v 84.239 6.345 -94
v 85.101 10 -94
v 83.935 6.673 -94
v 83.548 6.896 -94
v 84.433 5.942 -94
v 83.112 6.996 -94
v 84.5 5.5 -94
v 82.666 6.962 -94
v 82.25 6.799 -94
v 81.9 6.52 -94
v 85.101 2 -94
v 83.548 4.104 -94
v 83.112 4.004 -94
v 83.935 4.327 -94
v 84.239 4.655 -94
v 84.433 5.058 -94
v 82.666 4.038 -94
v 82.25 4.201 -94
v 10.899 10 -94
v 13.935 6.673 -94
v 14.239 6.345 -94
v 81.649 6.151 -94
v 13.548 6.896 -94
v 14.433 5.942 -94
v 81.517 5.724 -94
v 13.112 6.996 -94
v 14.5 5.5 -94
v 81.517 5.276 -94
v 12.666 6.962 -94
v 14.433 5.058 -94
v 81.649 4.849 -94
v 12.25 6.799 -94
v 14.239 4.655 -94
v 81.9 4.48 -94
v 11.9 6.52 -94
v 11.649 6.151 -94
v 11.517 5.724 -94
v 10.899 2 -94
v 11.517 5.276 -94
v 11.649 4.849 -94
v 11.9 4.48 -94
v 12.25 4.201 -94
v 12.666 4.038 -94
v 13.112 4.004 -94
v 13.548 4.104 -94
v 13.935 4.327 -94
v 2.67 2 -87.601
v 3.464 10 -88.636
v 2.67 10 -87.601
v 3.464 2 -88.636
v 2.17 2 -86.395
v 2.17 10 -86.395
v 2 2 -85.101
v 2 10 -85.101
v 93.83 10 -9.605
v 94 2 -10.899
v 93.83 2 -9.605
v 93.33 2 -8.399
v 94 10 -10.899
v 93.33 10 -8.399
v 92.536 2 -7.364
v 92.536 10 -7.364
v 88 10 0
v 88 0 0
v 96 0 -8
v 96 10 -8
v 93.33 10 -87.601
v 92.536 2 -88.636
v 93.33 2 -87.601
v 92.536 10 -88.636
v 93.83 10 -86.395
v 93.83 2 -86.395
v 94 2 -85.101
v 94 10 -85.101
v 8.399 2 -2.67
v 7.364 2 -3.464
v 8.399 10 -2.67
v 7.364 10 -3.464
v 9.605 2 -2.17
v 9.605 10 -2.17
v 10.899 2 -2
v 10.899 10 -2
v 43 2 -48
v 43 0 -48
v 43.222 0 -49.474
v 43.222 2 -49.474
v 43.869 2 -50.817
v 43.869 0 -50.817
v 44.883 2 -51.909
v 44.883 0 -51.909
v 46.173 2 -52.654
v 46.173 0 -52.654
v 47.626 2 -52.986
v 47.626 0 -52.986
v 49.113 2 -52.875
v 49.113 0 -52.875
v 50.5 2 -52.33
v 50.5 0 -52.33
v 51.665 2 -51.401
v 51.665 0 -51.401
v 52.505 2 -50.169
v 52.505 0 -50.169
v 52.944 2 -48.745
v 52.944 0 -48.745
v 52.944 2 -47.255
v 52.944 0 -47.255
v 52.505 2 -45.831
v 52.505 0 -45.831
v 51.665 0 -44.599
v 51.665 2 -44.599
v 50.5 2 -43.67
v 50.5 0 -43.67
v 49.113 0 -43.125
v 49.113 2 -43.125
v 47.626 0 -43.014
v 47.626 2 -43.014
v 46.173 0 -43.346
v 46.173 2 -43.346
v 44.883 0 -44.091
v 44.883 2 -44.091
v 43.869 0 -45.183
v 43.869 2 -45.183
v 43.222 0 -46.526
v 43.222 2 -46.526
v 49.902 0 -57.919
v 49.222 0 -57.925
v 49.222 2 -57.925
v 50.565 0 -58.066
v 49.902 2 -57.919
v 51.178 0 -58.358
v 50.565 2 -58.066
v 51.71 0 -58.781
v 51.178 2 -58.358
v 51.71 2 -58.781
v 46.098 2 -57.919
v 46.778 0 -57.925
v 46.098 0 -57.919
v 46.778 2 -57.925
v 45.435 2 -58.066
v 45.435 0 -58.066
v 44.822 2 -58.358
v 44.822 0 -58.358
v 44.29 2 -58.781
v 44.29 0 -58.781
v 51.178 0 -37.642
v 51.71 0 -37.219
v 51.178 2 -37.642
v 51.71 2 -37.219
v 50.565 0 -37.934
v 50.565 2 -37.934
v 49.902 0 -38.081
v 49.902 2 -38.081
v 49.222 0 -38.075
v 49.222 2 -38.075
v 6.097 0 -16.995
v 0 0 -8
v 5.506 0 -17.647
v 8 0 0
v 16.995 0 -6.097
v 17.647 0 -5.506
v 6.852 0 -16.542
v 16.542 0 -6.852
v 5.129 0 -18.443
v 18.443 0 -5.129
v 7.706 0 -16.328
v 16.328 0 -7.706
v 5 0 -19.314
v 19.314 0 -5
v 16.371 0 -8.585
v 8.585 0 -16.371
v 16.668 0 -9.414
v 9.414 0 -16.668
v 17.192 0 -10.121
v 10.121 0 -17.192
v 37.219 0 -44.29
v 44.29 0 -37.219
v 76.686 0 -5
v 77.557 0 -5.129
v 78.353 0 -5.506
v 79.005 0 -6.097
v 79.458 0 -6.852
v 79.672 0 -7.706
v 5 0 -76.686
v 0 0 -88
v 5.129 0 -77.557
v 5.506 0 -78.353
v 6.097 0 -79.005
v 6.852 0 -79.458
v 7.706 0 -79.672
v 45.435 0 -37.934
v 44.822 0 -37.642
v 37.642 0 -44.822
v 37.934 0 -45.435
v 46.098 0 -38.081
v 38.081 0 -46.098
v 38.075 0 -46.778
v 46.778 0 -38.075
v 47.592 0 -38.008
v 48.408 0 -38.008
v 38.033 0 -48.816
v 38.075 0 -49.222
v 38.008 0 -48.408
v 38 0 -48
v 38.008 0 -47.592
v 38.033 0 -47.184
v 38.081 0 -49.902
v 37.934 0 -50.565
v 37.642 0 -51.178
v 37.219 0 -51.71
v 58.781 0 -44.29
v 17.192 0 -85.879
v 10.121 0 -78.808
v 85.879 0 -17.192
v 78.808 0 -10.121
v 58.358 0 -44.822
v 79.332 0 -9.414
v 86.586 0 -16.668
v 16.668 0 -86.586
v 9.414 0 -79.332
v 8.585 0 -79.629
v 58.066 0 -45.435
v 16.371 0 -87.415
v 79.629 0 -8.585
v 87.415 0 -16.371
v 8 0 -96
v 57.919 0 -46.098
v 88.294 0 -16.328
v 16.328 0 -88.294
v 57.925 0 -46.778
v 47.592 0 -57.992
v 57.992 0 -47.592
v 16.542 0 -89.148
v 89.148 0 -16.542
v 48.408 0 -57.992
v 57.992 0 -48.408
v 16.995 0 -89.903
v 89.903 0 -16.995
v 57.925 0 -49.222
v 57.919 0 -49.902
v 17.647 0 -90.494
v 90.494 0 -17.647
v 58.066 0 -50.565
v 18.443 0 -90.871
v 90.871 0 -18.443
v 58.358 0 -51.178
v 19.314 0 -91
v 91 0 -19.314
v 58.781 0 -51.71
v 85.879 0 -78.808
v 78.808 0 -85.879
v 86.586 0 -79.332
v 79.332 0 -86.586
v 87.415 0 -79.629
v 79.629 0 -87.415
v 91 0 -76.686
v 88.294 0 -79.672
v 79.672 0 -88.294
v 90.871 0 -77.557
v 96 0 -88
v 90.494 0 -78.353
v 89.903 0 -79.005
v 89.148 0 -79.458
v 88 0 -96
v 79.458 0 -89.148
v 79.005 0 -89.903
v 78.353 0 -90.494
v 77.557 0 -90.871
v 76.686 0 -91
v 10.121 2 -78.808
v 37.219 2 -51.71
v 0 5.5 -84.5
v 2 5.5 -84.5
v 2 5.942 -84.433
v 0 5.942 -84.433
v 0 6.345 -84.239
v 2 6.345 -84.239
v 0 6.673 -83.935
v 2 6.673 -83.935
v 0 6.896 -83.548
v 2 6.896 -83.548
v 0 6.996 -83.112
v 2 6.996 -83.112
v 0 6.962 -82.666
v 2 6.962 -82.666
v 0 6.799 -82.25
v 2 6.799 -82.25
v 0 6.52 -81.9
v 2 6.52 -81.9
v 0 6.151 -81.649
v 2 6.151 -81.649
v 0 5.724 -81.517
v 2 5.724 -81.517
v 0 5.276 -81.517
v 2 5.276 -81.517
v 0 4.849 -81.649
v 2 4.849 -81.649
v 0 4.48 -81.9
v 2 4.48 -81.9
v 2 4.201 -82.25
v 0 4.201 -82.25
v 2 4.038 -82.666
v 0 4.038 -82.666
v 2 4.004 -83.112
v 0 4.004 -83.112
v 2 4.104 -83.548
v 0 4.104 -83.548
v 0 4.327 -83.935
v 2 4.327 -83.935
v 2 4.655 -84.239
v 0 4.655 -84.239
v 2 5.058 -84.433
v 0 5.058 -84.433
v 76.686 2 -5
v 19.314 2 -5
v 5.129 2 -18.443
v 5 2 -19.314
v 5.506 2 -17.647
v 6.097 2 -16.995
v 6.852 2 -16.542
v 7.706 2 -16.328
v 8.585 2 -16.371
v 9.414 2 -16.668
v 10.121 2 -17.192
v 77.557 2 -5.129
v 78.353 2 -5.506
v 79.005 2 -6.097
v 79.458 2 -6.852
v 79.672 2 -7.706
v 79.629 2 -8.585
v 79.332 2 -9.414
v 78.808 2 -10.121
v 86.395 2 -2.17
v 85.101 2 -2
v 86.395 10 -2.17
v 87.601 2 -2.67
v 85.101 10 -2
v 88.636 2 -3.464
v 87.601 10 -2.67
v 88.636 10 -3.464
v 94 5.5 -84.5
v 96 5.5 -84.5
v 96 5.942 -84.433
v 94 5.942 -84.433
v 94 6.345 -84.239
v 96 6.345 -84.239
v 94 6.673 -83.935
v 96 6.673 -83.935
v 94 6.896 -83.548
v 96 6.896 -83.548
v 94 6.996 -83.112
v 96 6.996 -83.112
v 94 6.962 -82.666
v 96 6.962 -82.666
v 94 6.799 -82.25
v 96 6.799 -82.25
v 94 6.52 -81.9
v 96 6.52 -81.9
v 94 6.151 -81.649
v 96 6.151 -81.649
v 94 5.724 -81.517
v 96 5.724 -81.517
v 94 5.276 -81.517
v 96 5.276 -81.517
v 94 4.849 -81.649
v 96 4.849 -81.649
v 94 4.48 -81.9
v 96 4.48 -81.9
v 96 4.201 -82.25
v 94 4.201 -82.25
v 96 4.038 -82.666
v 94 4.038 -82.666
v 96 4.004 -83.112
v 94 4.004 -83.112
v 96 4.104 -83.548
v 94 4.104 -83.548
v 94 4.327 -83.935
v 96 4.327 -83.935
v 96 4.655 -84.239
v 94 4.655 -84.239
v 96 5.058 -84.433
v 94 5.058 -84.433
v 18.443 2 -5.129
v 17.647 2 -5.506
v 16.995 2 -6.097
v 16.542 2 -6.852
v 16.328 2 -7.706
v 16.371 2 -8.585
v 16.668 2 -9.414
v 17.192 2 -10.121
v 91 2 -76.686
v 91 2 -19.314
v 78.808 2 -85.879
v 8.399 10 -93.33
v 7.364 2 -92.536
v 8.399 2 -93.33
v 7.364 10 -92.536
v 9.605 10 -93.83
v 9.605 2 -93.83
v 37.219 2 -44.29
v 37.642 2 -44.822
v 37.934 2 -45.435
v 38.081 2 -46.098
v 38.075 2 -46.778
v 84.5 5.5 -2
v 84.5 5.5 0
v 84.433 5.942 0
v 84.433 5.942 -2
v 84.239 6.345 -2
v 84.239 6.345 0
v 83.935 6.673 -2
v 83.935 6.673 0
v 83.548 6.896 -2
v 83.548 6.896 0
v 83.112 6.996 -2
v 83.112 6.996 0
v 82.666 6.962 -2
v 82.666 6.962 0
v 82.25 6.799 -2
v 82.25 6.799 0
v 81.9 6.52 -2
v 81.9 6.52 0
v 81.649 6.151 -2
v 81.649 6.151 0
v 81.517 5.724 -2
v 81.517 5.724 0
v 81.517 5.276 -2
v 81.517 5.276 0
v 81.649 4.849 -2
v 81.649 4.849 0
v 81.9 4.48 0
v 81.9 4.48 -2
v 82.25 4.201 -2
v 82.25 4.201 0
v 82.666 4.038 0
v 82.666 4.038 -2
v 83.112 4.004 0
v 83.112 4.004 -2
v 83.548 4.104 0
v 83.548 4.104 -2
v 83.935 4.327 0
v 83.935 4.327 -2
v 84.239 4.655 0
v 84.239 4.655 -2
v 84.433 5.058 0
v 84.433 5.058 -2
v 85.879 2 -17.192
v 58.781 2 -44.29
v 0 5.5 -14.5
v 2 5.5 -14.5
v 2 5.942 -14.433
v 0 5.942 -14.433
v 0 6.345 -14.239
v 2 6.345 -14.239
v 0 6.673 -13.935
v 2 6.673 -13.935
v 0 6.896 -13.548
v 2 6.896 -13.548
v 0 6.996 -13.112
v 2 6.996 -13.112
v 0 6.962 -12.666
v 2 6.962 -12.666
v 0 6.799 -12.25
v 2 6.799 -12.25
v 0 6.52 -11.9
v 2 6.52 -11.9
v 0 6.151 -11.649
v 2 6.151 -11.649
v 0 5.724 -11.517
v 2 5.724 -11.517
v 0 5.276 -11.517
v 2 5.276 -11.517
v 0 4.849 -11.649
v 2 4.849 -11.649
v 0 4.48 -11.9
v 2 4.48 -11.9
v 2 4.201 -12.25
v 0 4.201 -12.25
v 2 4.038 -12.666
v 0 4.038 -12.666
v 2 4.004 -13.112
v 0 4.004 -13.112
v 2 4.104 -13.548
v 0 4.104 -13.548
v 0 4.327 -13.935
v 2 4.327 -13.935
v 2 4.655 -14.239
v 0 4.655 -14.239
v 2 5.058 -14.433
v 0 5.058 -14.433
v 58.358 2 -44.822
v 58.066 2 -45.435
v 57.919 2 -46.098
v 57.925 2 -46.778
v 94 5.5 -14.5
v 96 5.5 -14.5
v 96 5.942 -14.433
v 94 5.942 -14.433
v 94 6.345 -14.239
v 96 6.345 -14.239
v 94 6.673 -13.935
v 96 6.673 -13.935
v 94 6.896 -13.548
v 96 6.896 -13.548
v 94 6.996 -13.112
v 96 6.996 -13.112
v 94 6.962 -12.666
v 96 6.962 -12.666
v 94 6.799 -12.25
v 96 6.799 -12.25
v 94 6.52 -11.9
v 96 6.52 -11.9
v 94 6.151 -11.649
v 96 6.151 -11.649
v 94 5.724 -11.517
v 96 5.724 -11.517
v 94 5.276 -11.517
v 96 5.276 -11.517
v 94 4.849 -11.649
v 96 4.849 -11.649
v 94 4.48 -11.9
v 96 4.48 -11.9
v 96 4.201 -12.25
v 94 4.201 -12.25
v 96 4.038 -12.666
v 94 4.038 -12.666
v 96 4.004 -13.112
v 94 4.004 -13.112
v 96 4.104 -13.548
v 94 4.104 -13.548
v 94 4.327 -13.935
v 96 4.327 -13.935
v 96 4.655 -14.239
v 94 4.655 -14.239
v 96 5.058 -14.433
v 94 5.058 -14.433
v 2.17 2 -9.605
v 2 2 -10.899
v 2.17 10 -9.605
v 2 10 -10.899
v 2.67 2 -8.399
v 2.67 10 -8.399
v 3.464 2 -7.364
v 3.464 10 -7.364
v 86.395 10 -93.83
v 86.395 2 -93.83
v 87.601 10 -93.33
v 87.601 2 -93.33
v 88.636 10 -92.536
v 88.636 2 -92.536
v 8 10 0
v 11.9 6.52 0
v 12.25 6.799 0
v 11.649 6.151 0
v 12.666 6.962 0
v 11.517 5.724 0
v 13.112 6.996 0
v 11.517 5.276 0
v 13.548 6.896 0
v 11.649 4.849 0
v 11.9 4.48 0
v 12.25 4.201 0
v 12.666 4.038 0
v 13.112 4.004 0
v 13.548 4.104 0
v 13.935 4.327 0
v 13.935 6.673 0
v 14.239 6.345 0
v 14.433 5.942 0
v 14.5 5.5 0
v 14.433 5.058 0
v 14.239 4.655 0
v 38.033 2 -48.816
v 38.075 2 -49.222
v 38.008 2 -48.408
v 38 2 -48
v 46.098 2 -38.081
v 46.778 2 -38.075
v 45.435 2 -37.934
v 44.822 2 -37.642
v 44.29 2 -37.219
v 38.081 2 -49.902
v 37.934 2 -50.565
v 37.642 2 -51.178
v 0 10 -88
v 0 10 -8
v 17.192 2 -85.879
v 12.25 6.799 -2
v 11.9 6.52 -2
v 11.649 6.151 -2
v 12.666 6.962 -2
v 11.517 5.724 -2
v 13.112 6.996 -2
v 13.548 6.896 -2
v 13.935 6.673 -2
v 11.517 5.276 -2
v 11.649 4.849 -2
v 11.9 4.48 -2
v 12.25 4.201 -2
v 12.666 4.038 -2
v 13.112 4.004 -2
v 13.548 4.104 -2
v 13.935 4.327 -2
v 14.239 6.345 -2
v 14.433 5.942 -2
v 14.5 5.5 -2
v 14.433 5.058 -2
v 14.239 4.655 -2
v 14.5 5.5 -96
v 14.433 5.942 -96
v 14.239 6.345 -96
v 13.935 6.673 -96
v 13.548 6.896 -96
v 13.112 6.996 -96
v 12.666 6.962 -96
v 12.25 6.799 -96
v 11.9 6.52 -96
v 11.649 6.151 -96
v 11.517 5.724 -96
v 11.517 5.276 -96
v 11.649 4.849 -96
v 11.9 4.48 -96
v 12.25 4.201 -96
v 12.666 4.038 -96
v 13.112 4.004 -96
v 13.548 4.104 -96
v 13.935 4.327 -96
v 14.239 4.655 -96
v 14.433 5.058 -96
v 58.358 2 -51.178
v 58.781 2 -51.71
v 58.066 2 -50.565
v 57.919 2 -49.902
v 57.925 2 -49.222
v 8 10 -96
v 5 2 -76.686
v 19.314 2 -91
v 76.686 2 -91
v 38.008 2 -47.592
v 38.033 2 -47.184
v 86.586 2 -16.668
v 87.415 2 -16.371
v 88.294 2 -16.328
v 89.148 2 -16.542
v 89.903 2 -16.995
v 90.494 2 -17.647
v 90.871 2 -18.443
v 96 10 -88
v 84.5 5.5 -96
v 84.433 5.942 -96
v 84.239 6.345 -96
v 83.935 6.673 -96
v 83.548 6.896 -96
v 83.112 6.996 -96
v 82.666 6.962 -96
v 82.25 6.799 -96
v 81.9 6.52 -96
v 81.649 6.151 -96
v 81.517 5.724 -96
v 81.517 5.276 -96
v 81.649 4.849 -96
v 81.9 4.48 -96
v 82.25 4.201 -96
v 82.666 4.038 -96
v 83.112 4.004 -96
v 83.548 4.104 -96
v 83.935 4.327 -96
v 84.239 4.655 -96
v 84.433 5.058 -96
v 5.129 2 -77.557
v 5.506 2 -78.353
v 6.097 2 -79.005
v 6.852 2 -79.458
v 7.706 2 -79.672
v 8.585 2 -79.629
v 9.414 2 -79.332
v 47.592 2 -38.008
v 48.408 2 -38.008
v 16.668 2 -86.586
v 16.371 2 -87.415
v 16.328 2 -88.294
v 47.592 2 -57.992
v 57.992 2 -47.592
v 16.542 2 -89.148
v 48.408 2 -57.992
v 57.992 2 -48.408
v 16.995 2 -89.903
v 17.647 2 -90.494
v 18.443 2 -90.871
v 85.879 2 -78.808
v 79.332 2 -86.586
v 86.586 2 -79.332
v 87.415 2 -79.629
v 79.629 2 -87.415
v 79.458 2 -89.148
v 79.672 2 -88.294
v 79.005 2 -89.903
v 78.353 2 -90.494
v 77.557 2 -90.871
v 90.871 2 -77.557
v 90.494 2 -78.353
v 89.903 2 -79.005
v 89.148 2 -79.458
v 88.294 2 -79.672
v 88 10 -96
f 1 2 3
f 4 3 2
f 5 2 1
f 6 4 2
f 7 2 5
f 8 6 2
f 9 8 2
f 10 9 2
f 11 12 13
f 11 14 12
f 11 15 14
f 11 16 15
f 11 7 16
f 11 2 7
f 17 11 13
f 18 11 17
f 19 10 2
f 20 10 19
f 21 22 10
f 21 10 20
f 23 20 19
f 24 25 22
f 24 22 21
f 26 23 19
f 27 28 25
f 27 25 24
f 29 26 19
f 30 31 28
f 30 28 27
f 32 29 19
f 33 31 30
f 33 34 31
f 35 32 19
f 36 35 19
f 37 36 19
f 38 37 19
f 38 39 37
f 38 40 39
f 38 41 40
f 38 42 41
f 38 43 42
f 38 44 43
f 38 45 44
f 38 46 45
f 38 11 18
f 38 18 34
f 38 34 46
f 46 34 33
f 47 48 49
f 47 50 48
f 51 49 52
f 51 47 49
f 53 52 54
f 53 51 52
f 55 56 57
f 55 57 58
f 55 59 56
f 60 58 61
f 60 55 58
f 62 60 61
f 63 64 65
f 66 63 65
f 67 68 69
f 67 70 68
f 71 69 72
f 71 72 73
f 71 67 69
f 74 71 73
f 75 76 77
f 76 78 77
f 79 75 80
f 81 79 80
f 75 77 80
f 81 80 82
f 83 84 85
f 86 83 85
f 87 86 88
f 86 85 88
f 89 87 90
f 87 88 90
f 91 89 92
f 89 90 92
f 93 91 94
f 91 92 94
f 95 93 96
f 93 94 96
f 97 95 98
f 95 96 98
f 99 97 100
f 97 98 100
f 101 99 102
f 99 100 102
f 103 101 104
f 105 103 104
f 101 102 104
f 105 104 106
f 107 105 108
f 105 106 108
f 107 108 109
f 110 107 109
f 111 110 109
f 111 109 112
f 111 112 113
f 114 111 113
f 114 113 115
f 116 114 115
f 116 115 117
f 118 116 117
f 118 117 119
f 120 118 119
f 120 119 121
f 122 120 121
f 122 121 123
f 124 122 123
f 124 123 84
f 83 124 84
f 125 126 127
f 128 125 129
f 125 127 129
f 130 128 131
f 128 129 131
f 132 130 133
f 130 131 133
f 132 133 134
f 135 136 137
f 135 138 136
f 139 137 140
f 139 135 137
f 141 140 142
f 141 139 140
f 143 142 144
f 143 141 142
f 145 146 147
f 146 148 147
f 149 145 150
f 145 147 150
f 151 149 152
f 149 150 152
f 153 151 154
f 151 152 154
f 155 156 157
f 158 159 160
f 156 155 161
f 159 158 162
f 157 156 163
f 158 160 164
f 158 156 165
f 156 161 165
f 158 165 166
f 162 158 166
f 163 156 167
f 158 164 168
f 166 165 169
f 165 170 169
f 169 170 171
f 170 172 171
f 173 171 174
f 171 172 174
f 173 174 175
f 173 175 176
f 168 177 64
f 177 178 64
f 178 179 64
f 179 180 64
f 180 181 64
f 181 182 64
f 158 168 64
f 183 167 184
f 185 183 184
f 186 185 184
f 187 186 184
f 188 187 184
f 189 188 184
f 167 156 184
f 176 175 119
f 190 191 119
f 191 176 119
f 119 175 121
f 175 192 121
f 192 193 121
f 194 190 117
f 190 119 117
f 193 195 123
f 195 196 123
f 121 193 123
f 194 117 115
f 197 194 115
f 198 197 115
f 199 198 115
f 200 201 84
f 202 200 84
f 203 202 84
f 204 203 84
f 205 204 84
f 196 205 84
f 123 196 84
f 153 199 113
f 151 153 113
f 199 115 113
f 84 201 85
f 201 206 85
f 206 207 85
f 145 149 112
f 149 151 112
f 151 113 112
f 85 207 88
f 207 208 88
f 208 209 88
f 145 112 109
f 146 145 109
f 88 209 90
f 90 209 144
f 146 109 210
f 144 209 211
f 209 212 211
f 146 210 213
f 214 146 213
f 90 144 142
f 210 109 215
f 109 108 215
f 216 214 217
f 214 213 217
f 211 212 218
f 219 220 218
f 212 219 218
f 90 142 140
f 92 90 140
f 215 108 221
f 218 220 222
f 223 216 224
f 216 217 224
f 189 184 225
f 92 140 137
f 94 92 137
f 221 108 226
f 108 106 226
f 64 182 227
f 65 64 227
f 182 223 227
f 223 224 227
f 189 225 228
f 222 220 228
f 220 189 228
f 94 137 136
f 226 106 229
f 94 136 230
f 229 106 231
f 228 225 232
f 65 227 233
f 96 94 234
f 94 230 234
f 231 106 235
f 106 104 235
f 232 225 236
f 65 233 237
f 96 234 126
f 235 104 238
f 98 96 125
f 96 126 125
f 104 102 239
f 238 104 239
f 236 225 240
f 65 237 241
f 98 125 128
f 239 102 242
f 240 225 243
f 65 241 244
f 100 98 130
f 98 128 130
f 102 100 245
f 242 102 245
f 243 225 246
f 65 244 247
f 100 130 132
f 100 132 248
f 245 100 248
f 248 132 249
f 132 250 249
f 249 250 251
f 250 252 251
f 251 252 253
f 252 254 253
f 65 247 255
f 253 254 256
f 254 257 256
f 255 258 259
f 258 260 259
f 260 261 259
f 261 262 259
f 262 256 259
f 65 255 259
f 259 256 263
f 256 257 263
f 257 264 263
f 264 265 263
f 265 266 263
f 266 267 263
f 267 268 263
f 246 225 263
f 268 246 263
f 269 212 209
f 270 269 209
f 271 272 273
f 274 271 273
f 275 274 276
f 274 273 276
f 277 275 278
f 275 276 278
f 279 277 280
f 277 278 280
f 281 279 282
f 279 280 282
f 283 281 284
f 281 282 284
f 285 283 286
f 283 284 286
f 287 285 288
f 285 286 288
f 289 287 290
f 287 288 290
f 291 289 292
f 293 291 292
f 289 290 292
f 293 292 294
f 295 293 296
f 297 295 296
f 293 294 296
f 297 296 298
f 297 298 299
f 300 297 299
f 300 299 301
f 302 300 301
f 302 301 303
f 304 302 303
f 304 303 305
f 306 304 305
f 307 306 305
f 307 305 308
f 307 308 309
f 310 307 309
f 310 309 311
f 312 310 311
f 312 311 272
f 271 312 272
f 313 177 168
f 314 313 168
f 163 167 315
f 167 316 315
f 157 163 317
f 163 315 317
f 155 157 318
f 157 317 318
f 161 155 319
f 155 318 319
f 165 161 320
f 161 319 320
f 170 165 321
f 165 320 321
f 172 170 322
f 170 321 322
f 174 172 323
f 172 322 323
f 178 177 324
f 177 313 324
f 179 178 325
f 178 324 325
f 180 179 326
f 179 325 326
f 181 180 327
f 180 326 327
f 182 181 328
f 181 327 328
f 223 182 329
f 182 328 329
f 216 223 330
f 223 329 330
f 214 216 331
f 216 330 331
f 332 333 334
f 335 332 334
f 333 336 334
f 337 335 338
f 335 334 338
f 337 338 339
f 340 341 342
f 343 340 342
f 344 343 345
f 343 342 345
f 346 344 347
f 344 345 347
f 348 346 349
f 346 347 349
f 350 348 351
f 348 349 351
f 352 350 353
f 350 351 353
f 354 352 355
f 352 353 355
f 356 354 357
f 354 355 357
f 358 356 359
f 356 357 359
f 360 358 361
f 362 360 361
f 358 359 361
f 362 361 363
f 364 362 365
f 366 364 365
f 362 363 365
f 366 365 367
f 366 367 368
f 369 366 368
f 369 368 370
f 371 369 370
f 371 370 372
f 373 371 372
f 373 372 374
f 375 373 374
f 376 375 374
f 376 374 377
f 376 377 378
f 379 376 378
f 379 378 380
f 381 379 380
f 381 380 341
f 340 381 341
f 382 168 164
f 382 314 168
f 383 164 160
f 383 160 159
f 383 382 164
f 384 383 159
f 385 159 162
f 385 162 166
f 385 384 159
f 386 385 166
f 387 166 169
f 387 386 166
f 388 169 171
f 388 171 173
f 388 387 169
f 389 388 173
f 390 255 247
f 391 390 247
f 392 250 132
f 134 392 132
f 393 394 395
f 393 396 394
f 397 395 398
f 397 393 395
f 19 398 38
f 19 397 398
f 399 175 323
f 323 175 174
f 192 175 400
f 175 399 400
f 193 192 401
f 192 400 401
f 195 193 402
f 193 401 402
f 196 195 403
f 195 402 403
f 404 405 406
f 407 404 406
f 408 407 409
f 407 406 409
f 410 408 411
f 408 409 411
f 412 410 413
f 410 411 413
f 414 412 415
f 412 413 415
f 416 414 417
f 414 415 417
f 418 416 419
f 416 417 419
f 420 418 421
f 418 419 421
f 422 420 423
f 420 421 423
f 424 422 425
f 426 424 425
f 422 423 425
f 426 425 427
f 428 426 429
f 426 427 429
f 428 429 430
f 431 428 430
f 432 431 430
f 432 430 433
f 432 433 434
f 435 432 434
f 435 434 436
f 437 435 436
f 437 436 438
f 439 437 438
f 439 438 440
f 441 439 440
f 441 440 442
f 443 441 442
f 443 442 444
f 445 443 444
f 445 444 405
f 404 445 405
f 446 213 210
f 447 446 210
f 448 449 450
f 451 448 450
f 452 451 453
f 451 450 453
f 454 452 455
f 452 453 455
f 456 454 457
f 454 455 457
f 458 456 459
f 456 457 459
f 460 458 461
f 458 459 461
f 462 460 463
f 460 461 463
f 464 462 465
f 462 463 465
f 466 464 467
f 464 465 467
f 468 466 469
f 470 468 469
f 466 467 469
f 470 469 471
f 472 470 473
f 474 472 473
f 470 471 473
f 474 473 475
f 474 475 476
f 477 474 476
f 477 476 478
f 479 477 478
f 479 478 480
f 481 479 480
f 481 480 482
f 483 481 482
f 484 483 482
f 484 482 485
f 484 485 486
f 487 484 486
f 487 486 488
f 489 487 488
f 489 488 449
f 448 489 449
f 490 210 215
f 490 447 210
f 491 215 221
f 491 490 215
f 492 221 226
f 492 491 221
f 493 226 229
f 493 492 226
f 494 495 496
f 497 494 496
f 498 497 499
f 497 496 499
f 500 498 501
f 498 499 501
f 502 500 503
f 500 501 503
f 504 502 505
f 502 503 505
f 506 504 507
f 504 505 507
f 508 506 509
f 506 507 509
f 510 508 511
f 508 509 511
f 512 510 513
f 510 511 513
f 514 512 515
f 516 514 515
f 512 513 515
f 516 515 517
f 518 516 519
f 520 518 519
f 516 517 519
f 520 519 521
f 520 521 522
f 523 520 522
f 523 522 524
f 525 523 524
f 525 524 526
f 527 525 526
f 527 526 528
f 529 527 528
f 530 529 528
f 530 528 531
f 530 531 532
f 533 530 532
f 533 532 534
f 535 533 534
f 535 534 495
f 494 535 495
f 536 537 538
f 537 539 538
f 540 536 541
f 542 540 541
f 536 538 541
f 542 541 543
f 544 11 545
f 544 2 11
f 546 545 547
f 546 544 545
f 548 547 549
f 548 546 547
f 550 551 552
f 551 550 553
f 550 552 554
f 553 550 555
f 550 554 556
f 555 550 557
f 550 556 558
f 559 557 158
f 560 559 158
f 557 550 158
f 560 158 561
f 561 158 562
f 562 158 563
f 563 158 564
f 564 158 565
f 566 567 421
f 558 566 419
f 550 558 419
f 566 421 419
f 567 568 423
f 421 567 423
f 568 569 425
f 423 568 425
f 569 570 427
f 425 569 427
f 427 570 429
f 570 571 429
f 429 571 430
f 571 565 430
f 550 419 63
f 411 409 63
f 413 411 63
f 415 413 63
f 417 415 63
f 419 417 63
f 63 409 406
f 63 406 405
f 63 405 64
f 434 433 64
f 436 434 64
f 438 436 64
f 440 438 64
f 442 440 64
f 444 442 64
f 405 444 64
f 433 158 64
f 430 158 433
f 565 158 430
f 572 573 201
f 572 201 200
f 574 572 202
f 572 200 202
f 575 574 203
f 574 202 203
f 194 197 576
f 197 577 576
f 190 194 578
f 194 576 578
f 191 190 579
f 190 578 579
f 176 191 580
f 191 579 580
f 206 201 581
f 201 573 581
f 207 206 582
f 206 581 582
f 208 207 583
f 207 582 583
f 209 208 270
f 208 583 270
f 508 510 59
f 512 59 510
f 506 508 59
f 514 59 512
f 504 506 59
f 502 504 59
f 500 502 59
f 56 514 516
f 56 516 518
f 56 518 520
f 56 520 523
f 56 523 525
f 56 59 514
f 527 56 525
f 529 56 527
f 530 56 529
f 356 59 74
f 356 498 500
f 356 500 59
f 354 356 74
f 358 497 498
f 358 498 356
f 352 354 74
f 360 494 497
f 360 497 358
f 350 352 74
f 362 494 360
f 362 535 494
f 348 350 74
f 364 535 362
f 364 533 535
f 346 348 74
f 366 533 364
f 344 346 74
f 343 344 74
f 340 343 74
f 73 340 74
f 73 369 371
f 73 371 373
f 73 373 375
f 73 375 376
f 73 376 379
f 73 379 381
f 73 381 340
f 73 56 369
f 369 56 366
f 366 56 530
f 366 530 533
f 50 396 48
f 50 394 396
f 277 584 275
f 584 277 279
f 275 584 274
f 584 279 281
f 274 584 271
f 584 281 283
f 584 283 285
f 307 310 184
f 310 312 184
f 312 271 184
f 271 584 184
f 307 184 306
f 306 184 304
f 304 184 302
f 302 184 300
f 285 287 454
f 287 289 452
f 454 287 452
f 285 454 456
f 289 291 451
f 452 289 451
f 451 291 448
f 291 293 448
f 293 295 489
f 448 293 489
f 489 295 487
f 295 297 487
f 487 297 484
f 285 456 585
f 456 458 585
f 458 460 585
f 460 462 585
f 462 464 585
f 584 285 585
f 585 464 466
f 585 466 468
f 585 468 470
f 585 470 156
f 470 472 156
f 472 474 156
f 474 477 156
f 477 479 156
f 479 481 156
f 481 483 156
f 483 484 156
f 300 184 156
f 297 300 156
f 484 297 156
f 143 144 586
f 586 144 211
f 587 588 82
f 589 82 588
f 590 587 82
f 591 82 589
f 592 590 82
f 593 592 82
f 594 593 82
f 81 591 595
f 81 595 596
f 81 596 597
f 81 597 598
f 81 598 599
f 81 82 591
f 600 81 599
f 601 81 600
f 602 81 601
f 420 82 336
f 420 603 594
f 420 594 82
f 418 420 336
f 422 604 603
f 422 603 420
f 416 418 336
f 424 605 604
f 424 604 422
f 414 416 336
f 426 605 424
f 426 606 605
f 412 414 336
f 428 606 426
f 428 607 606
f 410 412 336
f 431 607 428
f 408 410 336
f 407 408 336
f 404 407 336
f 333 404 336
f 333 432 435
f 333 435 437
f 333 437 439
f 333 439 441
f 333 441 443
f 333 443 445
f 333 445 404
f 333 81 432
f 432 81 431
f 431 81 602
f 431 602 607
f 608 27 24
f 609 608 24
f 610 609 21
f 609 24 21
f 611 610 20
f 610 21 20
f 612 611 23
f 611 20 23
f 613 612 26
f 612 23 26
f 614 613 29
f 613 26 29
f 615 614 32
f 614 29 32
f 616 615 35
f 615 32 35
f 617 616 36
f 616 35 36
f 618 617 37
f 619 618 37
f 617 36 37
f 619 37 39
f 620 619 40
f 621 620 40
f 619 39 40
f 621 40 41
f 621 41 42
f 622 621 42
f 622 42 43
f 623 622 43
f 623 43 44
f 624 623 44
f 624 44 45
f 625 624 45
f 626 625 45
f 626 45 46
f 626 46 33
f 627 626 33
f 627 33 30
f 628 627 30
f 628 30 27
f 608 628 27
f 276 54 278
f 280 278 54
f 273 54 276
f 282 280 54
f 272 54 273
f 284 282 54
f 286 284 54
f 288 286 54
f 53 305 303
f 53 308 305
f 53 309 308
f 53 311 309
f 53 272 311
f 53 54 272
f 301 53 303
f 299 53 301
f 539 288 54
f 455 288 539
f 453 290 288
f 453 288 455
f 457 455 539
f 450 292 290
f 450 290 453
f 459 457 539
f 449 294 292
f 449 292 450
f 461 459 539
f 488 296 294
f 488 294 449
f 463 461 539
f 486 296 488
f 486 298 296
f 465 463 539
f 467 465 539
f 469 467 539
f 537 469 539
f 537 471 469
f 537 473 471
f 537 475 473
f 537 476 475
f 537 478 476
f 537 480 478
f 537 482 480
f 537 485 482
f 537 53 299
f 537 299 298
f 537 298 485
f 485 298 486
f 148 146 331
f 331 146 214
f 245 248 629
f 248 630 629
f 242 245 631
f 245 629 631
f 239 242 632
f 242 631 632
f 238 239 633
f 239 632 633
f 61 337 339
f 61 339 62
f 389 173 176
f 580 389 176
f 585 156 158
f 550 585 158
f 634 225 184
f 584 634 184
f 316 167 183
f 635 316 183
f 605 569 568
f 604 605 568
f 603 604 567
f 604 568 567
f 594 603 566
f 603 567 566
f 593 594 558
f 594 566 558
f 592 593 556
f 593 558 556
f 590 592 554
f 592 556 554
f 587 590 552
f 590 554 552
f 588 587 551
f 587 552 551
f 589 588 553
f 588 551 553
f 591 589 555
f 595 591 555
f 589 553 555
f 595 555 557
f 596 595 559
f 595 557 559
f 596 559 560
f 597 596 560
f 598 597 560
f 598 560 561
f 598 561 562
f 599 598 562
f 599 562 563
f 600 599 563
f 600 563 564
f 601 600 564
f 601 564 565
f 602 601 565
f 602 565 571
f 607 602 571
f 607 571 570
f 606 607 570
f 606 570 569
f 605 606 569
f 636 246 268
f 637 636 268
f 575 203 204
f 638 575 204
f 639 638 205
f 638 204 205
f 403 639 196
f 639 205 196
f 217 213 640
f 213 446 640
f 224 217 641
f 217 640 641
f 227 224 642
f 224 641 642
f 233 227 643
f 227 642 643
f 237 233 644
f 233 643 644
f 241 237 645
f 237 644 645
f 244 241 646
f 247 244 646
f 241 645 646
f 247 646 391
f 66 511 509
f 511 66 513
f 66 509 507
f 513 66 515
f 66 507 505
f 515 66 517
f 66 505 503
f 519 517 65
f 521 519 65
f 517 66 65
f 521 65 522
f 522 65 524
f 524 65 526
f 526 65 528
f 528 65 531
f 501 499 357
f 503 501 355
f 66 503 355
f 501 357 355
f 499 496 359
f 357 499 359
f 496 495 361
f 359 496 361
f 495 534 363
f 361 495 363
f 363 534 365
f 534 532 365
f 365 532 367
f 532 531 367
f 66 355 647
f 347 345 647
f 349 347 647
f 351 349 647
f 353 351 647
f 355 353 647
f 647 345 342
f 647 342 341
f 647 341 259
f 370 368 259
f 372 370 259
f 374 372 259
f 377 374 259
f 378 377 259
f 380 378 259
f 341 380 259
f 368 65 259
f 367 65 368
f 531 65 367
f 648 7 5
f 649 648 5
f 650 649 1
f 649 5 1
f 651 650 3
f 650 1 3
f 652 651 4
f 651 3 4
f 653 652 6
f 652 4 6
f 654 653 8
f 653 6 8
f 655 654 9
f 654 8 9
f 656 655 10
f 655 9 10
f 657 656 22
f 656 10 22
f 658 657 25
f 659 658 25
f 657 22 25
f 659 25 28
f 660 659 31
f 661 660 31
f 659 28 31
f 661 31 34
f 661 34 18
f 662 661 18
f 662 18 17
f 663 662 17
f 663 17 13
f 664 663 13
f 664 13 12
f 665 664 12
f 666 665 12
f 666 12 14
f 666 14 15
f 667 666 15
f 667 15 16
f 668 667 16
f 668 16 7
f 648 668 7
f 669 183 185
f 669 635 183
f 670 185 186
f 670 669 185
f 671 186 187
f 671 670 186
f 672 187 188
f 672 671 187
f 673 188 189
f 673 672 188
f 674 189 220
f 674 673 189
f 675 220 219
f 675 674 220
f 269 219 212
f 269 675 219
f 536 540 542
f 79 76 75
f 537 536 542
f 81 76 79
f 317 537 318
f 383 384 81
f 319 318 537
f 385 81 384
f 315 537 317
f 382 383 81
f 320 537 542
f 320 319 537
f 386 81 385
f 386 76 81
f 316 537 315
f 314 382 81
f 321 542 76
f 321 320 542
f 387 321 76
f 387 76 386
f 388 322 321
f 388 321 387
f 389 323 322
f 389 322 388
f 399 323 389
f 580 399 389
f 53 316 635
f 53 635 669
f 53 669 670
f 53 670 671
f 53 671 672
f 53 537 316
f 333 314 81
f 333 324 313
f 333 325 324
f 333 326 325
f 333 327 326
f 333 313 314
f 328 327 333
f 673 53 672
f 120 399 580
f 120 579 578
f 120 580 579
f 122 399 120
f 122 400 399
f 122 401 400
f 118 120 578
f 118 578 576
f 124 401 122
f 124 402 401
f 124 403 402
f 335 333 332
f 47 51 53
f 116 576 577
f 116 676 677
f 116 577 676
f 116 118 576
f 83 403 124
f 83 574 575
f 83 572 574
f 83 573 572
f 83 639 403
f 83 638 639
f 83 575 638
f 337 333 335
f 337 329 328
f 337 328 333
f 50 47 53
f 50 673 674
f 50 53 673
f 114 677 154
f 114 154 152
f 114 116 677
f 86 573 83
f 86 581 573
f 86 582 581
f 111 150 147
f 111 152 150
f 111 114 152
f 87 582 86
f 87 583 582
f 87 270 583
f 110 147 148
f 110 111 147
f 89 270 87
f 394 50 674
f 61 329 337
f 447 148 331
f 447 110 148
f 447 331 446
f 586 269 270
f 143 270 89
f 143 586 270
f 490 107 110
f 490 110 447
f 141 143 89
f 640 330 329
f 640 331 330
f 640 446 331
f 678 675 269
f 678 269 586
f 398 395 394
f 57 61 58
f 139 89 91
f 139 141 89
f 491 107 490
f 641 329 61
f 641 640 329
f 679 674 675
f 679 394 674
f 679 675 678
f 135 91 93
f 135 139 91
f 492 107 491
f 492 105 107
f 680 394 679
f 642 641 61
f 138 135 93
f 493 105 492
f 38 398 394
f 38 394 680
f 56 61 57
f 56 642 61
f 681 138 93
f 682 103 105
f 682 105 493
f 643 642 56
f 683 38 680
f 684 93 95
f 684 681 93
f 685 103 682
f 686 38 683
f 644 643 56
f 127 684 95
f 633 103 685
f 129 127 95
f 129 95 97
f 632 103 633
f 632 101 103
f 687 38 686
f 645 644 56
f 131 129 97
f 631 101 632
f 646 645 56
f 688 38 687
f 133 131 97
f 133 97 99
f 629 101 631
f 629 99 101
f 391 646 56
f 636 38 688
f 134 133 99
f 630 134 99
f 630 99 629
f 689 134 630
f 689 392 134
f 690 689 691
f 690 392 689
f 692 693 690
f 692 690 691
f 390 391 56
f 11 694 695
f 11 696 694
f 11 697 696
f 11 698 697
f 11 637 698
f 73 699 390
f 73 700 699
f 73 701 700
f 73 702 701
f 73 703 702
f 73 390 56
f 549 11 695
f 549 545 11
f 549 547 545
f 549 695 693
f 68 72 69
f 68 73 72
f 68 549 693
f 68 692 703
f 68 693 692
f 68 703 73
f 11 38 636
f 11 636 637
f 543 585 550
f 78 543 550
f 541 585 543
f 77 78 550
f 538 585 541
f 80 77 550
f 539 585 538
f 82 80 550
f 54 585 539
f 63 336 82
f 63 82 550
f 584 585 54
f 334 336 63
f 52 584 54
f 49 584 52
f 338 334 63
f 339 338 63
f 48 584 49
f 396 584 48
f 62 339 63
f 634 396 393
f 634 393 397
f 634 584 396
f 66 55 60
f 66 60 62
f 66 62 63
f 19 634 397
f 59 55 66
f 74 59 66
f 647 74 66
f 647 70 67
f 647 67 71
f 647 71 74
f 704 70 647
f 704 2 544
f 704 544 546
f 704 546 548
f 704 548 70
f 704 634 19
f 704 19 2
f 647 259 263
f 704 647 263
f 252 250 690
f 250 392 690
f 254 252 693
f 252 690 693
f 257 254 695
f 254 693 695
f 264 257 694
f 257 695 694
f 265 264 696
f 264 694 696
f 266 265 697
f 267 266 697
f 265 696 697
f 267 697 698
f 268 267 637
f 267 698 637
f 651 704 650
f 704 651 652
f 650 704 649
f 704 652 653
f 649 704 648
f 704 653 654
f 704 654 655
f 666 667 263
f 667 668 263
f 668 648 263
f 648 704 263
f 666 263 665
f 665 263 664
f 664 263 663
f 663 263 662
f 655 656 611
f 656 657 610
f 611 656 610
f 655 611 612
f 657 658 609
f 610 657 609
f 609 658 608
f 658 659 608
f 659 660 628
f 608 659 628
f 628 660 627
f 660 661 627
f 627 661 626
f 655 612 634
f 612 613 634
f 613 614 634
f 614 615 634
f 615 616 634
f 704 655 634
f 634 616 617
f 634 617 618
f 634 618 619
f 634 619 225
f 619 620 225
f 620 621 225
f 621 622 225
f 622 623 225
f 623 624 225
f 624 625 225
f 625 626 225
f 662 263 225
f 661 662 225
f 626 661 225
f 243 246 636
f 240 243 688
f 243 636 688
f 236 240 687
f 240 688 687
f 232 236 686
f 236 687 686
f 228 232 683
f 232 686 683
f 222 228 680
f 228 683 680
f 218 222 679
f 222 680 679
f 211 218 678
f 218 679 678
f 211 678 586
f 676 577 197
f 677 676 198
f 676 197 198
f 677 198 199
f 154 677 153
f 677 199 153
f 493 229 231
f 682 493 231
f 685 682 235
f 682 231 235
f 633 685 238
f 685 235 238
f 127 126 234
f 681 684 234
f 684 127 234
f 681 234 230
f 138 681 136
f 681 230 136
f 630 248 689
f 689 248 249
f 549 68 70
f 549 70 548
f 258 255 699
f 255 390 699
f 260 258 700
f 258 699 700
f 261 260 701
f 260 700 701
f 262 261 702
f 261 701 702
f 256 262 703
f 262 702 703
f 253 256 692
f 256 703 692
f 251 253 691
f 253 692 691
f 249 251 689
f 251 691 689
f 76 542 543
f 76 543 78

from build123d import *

# Parameters (mm, degrees)
BOSS_EXTRUDE1_DEPTH = 10
SHELL1_T            = -2
SKETCH2_R           = 5
CUT_EXTRUDE1_DEPTH  = 11
FILLET1_R           = 3
SKETCH3_R           = 1.5
CUT_EXTRUDE2_DEPTH  = 97
SKETCH4_R           = 1.5
CUT_EXTRUDE3_DEPTH  = 97
FILLET2_R           = 5


with BuildPart() as part:
    # Sketch1 → Boss-Extrude1 (new body)
    with BuildSketch(Plane(origin=(0, 0, 0), x_dir=(1, 0, 0), z_dir=(0, 1, 0))):
        Polygon((0, 88), (0, 8), (8, 0), (88, 0), (96, 8), (96, 88), (88, 96), (8, 96), align=None)
    extrude(amount=BOSS_EXTRUDE1_DEPTH)

    # Shell1
    shell1_openings = [part.faces().sort_by_distance(p)[0] for p in [
        (48, 10, -48),
    ]]
    offset(amount=SHELL1_T, openings=shell1_openings, kind=Kind.INTERSECTION)

    # Sketch2 → Cut-Extrude1 (cut, through all)
    with BuildSketch(Plane(origin=(0, 0, 0), x_dir=(-1, 0, 0), z_dir=(0, -1, 0))):
        with BuildLine():
            Line((-45.411809549, 57.659258263), (-12.071067812, 91))
            Line((-12.071067812, 91), (-83.928932188, 91))
            Line((-83.928932188, 91), (-50.588190451, 57.659258263))
            ThreePointArc((-50.588190451, 57.659258263), (-48, 58), (-45.411809549, 57.659258263))
        make_face()
        with BuildLine():
            Line((-5, 83.928932188), (-38.340741737, 50.588190451))
            ThreePointArc((-38.340741737, 50.588190451), (-38.085551386, 49.305261922), (-38, 48))
            ThreePointArc((-38, 48), (-38.085551386, 46.694738078), (-38.340741737, 45.411809549))
            Line((-38.340741737, 45.411809549), (-5, 12.071067812))
            Line((-5, 12.071067812), (-5, 83.928932188))
        make_face()
        with BuildLine():
            Line((-12.071067812, 5), (-45.411809549, 38.340741737))
            ThreePointArc((-45.411809549, 38.340741737), (-48, 38), (-50.588190451, 38.340741737))
            Line((-50.588190451, 38.340741737), (-83.928932188, 5))
            Line((-83.928932188, 5), (-12.071067812, 5))
        make_face()
        with BuildLine():
            ThreePointArc((-57.659258263, 45.411809549), (-58, 48), (-57.659258263, 50.588190451))
            Line((-57.659258263, 50.588190451), (-91, 83.928932188))
            Line((-91, 83.928932188), (-91, 12.071067812))
            Line((-91, 12.071067812), (-57.659258263, 45.411809549))
        make_face()
        with Locations((-48, 48)):
            Circle(SKETCH2_R)
    extrude(amount=-CUT_EXTRUDE1_DEPTH, mode=Mode.SUBTRACT)

    # Fillet1
    fillet1_edges = [part.edges().sort_by_distance(p)[0] for p in [
        (50.588190451, 1, -38.340741737),
        (45.411809549, 1, -38.340741737),
        (12.071067812, 1, -5),
        (83.928932188, 1, -5),
        (38.340741737, 1, -45.411809549),
        (38.340741737, 1, -50.588190451),
        (5, 1, -83.928932188),
        (5, 1, -12.071067812),
        (57.659258263, 1, -50.588190451),
        (57.659258263, 1, -45.411809549),
        (91, 1, -12.071067812),
        (91, 1, -83.928932188),
        (45.411809549, 1, -57.659258263),
        (50.588190451, 1, -57.659258263),
        (83.928932188, 1, -91),
        (12.071067812, 1, -91),
    ]]
    fillet(fillet1_edges, radius=FILLET1_R)

    # Sketch3 → Cut-Extrude2 (cut, through all)
    with BuildSketch(Plane(origin=(96, 0, 0), x_dir=(0, 0, -1), z_dir=(1, 0, 0))):
        with Locations((83, 5.5)):
            Circle(SKETCH3_R)
        with Locations((13, 5.5)):
            Circle(SKETCH3_R)
    extrude(amount=-CUT_EXTRUDE2_DEPTH, mode=Mode.SUBTRACT)

    # Sketch4 → Cut-Extrude3 (cut, through all)
    with BuildSketch(Plane.XY):
        with Locations((83, 5.5)):
            Circle(SKETCH4_R)
        with Locations((13, 5.5)):
            Circle(SKETCH4_R)
    extrude(amount=-CUT_EXTRUDE3_DEPTH, mode=Mode.SUBTRACT)

    # Fillet2
    fillet2_edges = [part.edges().sort_by_distance(p)[0] for p in [
        (8.828427125, 6, -94),
        (2, 6, -87.171572875),
        (2, 6, -8.828427125),
        (8.828427125, 6, -2),
        (87.171572875, 6, -2),
        (94, 6, -8.828427125),
        (94, 6, -87.171572875),
        (87.171572875, 6, -94),
    ]]
    fillet(fillet2_edges, radius=FILLET2_R)


solid = part.part
